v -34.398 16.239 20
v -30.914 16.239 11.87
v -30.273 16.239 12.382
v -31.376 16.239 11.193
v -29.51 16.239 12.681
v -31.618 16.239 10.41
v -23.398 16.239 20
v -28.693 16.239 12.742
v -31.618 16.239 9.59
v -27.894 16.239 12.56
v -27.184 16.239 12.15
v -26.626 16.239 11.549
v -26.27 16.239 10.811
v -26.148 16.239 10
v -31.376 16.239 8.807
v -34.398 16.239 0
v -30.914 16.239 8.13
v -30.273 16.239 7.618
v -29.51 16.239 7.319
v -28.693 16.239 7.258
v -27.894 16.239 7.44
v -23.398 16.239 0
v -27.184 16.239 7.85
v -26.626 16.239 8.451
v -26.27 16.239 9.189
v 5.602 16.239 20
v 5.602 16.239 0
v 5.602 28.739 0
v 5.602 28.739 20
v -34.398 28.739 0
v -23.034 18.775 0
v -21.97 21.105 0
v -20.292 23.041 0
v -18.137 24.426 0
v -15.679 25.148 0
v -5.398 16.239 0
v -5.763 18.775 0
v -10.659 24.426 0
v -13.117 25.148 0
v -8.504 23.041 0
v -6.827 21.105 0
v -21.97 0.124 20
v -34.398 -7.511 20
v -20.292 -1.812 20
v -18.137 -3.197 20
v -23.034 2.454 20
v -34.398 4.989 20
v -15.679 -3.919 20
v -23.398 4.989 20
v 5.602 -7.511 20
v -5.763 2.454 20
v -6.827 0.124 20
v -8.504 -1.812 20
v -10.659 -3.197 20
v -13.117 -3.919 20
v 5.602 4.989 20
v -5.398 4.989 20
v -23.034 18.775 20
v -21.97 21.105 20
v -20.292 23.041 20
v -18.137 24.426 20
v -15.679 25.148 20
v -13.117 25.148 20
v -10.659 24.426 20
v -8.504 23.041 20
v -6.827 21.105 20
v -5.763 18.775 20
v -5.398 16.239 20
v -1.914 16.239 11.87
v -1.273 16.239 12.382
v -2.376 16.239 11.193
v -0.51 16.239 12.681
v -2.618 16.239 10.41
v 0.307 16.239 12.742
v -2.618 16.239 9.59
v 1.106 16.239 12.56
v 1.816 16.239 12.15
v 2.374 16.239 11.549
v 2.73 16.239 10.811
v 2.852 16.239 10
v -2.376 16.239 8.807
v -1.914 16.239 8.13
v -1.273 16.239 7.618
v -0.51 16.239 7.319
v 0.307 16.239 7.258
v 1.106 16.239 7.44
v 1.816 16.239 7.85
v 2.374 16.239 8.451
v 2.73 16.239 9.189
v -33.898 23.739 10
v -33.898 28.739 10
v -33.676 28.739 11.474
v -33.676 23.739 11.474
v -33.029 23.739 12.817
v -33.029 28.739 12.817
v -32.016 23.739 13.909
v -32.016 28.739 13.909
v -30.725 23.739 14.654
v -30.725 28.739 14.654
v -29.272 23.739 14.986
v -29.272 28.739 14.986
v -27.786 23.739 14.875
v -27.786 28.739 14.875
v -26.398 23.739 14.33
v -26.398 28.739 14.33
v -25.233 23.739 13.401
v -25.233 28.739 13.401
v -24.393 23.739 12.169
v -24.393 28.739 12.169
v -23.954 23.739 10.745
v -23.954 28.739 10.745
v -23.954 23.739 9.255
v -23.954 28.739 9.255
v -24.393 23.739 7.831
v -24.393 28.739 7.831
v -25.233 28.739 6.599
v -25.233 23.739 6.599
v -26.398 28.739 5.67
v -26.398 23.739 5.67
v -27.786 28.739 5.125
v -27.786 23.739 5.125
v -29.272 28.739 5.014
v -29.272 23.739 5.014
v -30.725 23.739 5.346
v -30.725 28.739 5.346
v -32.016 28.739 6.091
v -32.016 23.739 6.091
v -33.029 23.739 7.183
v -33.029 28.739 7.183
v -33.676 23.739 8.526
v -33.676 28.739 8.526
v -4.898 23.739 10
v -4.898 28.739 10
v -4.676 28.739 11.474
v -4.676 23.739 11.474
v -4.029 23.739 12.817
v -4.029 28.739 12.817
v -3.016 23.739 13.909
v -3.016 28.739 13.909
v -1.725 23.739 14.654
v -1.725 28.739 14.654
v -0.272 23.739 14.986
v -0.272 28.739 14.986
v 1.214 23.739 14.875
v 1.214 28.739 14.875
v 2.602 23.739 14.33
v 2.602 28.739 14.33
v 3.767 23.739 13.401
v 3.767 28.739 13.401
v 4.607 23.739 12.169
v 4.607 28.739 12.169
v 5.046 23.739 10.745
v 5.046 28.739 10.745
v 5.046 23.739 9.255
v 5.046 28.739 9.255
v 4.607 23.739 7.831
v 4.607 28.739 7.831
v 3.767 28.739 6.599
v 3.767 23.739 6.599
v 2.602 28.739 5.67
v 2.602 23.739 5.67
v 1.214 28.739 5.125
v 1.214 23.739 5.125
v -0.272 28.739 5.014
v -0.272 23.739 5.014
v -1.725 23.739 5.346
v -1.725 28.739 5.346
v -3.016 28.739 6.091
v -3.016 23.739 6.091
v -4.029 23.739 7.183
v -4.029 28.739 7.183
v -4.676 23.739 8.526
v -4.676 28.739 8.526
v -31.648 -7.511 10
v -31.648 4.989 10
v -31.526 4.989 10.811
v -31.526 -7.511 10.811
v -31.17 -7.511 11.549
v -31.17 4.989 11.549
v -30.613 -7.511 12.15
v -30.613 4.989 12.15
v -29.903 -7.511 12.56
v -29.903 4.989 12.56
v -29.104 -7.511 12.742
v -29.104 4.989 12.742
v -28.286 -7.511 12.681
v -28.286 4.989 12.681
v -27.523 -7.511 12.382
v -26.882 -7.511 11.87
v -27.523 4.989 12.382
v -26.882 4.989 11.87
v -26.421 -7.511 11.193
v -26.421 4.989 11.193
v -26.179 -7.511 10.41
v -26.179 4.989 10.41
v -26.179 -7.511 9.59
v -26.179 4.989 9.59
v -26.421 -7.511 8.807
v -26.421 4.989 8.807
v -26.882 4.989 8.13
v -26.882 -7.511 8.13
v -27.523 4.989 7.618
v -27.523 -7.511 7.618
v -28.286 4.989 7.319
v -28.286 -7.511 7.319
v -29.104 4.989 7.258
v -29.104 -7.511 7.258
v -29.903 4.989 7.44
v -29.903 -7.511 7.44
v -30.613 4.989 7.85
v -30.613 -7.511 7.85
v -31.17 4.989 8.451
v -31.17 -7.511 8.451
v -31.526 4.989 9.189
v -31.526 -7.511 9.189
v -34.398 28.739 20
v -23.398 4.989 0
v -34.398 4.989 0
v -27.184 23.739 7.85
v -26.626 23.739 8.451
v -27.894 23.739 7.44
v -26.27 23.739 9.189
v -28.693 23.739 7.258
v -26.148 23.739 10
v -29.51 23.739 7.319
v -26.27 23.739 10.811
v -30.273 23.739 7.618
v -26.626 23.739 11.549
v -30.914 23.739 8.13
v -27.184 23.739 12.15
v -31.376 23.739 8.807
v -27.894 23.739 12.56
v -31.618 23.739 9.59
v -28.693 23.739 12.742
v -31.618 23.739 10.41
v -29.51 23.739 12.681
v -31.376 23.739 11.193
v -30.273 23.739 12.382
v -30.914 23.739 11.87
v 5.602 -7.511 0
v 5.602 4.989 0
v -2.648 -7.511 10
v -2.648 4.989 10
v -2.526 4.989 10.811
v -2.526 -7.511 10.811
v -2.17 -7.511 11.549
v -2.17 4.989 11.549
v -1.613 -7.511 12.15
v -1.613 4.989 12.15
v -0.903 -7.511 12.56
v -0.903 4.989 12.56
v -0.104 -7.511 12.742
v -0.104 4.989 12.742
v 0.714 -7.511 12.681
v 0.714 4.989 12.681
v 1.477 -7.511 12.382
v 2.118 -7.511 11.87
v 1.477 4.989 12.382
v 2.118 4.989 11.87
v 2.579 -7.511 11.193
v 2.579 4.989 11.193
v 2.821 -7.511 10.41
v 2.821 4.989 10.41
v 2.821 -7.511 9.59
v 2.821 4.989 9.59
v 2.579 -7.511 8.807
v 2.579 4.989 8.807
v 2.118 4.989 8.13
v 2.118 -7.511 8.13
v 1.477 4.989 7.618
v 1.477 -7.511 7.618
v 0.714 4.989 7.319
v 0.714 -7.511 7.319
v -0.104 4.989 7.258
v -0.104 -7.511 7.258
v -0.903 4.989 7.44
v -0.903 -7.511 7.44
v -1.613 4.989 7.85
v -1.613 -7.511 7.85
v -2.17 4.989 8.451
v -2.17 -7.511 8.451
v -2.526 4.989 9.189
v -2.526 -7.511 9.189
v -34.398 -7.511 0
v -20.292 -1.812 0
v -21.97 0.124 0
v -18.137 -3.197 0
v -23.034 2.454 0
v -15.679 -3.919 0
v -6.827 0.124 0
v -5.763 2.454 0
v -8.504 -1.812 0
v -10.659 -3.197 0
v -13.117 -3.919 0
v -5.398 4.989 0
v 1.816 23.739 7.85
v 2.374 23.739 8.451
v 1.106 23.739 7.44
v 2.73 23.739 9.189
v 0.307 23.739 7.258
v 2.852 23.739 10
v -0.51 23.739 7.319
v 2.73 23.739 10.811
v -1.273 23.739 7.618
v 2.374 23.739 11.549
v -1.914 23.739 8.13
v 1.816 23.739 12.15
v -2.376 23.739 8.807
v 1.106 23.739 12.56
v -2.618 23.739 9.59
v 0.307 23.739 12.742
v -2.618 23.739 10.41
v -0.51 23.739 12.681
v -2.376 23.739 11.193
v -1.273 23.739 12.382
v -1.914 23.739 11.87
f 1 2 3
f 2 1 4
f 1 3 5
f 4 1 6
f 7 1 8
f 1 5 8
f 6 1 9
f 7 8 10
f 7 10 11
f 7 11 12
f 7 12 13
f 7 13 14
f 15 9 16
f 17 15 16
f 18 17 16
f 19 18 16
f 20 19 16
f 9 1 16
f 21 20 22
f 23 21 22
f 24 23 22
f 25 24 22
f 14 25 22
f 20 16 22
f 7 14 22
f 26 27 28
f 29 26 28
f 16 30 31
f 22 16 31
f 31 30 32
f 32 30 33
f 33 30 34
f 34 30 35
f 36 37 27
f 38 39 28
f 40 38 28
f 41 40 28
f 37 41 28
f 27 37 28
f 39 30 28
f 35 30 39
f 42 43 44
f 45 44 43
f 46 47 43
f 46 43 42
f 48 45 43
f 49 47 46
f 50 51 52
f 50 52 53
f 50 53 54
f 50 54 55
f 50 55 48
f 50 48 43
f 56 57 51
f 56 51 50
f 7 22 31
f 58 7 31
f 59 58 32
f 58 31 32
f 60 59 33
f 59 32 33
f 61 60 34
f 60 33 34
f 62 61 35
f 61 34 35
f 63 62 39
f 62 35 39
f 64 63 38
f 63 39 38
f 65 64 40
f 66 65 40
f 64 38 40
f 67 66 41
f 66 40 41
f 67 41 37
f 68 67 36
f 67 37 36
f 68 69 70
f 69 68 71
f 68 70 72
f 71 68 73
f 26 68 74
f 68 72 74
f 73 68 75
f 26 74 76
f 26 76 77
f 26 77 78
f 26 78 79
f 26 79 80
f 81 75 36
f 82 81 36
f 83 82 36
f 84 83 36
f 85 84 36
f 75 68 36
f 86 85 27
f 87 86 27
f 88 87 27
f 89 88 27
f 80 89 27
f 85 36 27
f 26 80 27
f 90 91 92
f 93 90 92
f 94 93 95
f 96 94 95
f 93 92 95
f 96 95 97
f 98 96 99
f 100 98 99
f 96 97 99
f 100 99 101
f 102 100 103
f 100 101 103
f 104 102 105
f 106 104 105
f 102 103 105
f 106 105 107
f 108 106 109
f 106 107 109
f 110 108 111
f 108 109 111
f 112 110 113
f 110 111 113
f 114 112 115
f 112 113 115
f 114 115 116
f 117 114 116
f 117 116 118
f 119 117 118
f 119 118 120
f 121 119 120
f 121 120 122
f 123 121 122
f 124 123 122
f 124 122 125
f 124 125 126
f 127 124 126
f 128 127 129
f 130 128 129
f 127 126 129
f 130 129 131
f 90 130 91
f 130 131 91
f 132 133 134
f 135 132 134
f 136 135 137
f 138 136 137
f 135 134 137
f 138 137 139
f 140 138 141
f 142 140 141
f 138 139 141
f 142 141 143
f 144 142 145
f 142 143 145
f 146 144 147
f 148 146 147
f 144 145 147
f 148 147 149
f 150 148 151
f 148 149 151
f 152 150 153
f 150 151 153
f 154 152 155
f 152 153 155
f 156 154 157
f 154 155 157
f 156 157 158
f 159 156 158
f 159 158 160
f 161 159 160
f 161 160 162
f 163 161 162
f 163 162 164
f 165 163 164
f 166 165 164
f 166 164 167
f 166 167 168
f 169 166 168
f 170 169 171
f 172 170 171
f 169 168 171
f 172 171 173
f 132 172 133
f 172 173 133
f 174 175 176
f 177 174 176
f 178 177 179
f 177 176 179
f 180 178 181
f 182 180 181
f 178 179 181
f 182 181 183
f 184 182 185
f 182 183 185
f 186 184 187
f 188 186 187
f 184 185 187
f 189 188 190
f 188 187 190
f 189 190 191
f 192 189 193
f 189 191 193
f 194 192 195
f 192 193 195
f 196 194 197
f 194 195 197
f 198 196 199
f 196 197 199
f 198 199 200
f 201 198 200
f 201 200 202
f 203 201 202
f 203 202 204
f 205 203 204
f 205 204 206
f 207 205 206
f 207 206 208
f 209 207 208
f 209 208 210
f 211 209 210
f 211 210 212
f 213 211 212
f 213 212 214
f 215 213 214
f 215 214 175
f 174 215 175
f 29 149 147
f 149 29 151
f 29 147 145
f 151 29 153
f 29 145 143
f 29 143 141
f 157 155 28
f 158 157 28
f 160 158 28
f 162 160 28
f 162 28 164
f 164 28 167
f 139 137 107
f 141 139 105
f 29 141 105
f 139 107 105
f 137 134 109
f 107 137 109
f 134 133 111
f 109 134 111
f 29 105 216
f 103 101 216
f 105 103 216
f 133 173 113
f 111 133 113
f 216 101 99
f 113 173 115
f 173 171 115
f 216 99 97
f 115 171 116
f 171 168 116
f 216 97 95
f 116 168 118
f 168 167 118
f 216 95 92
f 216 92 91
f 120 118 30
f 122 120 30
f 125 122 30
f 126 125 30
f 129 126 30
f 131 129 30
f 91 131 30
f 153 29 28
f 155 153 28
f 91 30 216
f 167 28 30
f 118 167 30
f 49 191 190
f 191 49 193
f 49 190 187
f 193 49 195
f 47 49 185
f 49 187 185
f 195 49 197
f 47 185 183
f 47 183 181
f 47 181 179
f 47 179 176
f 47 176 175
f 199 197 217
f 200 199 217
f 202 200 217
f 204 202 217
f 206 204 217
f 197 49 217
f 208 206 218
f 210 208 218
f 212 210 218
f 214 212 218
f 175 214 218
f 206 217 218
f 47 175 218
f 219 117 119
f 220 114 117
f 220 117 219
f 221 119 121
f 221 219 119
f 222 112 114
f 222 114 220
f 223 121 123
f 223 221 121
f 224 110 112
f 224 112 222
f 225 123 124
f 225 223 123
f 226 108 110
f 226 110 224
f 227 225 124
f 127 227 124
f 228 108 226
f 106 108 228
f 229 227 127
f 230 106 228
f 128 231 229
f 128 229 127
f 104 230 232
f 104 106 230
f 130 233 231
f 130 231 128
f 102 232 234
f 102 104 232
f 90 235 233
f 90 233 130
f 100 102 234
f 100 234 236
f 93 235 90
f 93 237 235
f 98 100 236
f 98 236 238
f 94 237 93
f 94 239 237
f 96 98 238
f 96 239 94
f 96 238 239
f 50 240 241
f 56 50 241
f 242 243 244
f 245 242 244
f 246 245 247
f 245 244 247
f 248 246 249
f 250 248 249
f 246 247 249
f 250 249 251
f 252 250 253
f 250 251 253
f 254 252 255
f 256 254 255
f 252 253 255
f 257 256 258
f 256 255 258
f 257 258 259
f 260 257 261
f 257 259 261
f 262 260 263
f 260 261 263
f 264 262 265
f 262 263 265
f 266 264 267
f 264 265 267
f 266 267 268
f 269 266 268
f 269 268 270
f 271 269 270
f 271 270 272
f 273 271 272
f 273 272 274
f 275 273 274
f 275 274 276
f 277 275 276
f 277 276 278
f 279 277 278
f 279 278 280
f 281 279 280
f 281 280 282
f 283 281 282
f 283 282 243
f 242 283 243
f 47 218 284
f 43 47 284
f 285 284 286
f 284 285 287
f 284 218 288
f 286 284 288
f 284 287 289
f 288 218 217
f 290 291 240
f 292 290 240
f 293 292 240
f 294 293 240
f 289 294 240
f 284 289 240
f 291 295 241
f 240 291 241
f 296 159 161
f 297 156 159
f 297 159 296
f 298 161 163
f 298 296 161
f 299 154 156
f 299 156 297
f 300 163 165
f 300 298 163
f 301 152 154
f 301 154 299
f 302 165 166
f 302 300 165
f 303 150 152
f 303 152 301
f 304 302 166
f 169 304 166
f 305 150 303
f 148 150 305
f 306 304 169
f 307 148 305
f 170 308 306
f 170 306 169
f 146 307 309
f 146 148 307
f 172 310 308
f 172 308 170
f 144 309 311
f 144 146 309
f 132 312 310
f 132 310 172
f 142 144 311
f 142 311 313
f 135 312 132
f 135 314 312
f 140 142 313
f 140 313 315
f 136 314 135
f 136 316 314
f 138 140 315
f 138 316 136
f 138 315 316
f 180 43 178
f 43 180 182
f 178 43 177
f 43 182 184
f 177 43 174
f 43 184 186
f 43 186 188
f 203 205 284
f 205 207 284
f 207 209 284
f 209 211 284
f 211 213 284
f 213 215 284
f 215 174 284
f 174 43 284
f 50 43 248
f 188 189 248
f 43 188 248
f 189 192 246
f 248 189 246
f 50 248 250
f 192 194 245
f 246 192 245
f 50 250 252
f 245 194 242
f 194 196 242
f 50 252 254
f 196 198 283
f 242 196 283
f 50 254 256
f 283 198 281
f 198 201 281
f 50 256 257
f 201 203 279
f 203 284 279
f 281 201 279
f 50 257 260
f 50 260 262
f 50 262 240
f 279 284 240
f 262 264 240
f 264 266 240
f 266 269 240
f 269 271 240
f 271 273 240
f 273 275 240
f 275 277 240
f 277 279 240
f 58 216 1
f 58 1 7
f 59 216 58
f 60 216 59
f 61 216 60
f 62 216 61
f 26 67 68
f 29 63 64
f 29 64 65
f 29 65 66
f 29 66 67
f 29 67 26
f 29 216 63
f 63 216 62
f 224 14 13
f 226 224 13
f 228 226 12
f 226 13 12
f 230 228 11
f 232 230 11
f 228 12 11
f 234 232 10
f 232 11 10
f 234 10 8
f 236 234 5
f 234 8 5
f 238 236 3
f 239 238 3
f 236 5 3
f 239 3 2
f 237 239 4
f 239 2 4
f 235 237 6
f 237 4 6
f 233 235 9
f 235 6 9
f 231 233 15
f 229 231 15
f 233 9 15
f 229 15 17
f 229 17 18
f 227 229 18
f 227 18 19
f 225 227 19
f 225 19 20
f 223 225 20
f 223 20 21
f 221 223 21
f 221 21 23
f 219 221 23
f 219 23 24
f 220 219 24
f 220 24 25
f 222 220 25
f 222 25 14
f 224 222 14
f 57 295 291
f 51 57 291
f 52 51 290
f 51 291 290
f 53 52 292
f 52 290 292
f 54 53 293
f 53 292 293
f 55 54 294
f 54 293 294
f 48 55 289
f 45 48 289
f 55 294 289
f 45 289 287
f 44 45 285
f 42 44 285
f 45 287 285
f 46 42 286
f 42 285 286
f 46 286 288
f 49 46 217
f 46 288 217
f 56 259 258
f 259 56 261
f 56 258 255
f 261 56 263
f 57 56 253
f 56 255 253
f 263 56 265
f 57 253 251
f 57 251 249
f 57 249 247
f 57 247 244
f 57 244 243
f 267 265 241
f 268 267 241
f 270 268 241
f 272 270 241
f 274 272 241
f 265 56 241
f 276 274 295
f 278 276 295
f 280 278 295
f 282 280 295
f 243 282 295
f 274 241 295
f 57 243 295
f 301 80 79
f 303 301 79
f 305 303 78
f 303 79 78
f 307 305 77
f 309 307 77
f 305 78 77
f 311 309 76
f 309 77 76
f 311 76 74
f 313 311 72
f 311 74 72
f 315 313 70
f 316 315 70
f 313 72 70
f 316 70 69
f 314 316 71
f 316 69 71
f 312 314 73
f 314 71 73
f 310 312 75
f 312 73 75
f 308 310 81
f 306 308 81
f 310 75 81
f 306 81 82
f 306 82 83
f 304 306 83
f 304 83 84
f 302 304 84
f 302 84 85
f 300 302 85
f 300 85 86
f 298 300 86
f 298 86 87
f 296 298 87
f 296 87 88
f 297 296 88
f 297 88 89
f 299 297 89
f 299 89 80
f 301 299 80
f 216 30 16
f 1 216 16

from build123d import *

# Parameters (mm, degrees)
F1_DEPTH = 20
F2_R     = 2.75
F3_DEPTH = 25
F4_R     = 2.75
F5_DEPTH = 12.5
F6_R     = 5
F7_DEPTH = 5


with BuildPart() as f1:
    # F0 (on Top) → F1 (new body)
    with BuildSketch(Plane.XY):
        with BuildLine():
            Line((-34.39823, 28.739346), (-34.39823, 16.239346))
            Line((-34.39823, 16.239346), (-23.39823, 16.239346))
            ThreePointArc((-23.39823, 16.239346), (-14.39823, 25.239346), (-5.39823, 16.239346))
            Line((-5.39823, 16.239346), (5.60177, 16.239346))
            Line((5.60177, 16.239346), (5.60177, 28.739346))
            Line((5.60177, 28.739346), (-34.39823, 28.739346))
        make_face()
        with BuildLine():
            Line((-23.39823, 4.989345), (-34.39823, 4.989345))
            Line((-34.39823, 4.989345), (-34.39823, -7.510655))
            Line((-34.39823, -7.510655), (5.60177, -7.510655))
            Line((5.60177, -7.510655), (5.60177, 4.989345))
            Line((5.60177, 4.989345), (-5.39823, 4.989345))
            ThreePointArc((-5.39823, 4.989345), (-14.39823, -4.010655), (-23.39823, 4.989345))
        make_face()
    extrude(amount=F1_DEPTH)

    # F2 (on face) → F3 (cut)
    with BuildSketch(Plane(origin=(0, 4.989345, 0), x_dir=(-1, 0, 0), z_dir=(0, 1, 0))):
        with Locations((-0.10177, 10)):
            Circle(F2_R)
        with Locations((28.89823, 10)):
            Circle(F2_R)
    extrude(amount=-F3_DEPTH, mode=Mode.SUBTRACT)

    # F4 (on face) → F5 (cut)
    with BuildSketch(Plane.XZ.offset(-16.239346)):
        with Locations((-28.89823, 10)):
            Circle(F4_R)
        with Locations((0.10177, 10)):
            Circle(F4_R)
    extrude(amount=-F5_DEPTH, mode=Mode.SUBTRACT)

    # F6 (on face) → F7 (cut)
    with BuildSketch(Plane(origin=(0, 28.739346, 0), x_dir=(-1, 0, 0), z_dir=(0, 1, 0))):
        with Locations((-0.10177, 10)):
            Circle(F6_R)
        with Locations((28.89823, 10)):
            Circle(F6_R)
    extrude(amount=-F7_DEPTH, mode=Mode.SUBTRACT)


solid = f1.part
